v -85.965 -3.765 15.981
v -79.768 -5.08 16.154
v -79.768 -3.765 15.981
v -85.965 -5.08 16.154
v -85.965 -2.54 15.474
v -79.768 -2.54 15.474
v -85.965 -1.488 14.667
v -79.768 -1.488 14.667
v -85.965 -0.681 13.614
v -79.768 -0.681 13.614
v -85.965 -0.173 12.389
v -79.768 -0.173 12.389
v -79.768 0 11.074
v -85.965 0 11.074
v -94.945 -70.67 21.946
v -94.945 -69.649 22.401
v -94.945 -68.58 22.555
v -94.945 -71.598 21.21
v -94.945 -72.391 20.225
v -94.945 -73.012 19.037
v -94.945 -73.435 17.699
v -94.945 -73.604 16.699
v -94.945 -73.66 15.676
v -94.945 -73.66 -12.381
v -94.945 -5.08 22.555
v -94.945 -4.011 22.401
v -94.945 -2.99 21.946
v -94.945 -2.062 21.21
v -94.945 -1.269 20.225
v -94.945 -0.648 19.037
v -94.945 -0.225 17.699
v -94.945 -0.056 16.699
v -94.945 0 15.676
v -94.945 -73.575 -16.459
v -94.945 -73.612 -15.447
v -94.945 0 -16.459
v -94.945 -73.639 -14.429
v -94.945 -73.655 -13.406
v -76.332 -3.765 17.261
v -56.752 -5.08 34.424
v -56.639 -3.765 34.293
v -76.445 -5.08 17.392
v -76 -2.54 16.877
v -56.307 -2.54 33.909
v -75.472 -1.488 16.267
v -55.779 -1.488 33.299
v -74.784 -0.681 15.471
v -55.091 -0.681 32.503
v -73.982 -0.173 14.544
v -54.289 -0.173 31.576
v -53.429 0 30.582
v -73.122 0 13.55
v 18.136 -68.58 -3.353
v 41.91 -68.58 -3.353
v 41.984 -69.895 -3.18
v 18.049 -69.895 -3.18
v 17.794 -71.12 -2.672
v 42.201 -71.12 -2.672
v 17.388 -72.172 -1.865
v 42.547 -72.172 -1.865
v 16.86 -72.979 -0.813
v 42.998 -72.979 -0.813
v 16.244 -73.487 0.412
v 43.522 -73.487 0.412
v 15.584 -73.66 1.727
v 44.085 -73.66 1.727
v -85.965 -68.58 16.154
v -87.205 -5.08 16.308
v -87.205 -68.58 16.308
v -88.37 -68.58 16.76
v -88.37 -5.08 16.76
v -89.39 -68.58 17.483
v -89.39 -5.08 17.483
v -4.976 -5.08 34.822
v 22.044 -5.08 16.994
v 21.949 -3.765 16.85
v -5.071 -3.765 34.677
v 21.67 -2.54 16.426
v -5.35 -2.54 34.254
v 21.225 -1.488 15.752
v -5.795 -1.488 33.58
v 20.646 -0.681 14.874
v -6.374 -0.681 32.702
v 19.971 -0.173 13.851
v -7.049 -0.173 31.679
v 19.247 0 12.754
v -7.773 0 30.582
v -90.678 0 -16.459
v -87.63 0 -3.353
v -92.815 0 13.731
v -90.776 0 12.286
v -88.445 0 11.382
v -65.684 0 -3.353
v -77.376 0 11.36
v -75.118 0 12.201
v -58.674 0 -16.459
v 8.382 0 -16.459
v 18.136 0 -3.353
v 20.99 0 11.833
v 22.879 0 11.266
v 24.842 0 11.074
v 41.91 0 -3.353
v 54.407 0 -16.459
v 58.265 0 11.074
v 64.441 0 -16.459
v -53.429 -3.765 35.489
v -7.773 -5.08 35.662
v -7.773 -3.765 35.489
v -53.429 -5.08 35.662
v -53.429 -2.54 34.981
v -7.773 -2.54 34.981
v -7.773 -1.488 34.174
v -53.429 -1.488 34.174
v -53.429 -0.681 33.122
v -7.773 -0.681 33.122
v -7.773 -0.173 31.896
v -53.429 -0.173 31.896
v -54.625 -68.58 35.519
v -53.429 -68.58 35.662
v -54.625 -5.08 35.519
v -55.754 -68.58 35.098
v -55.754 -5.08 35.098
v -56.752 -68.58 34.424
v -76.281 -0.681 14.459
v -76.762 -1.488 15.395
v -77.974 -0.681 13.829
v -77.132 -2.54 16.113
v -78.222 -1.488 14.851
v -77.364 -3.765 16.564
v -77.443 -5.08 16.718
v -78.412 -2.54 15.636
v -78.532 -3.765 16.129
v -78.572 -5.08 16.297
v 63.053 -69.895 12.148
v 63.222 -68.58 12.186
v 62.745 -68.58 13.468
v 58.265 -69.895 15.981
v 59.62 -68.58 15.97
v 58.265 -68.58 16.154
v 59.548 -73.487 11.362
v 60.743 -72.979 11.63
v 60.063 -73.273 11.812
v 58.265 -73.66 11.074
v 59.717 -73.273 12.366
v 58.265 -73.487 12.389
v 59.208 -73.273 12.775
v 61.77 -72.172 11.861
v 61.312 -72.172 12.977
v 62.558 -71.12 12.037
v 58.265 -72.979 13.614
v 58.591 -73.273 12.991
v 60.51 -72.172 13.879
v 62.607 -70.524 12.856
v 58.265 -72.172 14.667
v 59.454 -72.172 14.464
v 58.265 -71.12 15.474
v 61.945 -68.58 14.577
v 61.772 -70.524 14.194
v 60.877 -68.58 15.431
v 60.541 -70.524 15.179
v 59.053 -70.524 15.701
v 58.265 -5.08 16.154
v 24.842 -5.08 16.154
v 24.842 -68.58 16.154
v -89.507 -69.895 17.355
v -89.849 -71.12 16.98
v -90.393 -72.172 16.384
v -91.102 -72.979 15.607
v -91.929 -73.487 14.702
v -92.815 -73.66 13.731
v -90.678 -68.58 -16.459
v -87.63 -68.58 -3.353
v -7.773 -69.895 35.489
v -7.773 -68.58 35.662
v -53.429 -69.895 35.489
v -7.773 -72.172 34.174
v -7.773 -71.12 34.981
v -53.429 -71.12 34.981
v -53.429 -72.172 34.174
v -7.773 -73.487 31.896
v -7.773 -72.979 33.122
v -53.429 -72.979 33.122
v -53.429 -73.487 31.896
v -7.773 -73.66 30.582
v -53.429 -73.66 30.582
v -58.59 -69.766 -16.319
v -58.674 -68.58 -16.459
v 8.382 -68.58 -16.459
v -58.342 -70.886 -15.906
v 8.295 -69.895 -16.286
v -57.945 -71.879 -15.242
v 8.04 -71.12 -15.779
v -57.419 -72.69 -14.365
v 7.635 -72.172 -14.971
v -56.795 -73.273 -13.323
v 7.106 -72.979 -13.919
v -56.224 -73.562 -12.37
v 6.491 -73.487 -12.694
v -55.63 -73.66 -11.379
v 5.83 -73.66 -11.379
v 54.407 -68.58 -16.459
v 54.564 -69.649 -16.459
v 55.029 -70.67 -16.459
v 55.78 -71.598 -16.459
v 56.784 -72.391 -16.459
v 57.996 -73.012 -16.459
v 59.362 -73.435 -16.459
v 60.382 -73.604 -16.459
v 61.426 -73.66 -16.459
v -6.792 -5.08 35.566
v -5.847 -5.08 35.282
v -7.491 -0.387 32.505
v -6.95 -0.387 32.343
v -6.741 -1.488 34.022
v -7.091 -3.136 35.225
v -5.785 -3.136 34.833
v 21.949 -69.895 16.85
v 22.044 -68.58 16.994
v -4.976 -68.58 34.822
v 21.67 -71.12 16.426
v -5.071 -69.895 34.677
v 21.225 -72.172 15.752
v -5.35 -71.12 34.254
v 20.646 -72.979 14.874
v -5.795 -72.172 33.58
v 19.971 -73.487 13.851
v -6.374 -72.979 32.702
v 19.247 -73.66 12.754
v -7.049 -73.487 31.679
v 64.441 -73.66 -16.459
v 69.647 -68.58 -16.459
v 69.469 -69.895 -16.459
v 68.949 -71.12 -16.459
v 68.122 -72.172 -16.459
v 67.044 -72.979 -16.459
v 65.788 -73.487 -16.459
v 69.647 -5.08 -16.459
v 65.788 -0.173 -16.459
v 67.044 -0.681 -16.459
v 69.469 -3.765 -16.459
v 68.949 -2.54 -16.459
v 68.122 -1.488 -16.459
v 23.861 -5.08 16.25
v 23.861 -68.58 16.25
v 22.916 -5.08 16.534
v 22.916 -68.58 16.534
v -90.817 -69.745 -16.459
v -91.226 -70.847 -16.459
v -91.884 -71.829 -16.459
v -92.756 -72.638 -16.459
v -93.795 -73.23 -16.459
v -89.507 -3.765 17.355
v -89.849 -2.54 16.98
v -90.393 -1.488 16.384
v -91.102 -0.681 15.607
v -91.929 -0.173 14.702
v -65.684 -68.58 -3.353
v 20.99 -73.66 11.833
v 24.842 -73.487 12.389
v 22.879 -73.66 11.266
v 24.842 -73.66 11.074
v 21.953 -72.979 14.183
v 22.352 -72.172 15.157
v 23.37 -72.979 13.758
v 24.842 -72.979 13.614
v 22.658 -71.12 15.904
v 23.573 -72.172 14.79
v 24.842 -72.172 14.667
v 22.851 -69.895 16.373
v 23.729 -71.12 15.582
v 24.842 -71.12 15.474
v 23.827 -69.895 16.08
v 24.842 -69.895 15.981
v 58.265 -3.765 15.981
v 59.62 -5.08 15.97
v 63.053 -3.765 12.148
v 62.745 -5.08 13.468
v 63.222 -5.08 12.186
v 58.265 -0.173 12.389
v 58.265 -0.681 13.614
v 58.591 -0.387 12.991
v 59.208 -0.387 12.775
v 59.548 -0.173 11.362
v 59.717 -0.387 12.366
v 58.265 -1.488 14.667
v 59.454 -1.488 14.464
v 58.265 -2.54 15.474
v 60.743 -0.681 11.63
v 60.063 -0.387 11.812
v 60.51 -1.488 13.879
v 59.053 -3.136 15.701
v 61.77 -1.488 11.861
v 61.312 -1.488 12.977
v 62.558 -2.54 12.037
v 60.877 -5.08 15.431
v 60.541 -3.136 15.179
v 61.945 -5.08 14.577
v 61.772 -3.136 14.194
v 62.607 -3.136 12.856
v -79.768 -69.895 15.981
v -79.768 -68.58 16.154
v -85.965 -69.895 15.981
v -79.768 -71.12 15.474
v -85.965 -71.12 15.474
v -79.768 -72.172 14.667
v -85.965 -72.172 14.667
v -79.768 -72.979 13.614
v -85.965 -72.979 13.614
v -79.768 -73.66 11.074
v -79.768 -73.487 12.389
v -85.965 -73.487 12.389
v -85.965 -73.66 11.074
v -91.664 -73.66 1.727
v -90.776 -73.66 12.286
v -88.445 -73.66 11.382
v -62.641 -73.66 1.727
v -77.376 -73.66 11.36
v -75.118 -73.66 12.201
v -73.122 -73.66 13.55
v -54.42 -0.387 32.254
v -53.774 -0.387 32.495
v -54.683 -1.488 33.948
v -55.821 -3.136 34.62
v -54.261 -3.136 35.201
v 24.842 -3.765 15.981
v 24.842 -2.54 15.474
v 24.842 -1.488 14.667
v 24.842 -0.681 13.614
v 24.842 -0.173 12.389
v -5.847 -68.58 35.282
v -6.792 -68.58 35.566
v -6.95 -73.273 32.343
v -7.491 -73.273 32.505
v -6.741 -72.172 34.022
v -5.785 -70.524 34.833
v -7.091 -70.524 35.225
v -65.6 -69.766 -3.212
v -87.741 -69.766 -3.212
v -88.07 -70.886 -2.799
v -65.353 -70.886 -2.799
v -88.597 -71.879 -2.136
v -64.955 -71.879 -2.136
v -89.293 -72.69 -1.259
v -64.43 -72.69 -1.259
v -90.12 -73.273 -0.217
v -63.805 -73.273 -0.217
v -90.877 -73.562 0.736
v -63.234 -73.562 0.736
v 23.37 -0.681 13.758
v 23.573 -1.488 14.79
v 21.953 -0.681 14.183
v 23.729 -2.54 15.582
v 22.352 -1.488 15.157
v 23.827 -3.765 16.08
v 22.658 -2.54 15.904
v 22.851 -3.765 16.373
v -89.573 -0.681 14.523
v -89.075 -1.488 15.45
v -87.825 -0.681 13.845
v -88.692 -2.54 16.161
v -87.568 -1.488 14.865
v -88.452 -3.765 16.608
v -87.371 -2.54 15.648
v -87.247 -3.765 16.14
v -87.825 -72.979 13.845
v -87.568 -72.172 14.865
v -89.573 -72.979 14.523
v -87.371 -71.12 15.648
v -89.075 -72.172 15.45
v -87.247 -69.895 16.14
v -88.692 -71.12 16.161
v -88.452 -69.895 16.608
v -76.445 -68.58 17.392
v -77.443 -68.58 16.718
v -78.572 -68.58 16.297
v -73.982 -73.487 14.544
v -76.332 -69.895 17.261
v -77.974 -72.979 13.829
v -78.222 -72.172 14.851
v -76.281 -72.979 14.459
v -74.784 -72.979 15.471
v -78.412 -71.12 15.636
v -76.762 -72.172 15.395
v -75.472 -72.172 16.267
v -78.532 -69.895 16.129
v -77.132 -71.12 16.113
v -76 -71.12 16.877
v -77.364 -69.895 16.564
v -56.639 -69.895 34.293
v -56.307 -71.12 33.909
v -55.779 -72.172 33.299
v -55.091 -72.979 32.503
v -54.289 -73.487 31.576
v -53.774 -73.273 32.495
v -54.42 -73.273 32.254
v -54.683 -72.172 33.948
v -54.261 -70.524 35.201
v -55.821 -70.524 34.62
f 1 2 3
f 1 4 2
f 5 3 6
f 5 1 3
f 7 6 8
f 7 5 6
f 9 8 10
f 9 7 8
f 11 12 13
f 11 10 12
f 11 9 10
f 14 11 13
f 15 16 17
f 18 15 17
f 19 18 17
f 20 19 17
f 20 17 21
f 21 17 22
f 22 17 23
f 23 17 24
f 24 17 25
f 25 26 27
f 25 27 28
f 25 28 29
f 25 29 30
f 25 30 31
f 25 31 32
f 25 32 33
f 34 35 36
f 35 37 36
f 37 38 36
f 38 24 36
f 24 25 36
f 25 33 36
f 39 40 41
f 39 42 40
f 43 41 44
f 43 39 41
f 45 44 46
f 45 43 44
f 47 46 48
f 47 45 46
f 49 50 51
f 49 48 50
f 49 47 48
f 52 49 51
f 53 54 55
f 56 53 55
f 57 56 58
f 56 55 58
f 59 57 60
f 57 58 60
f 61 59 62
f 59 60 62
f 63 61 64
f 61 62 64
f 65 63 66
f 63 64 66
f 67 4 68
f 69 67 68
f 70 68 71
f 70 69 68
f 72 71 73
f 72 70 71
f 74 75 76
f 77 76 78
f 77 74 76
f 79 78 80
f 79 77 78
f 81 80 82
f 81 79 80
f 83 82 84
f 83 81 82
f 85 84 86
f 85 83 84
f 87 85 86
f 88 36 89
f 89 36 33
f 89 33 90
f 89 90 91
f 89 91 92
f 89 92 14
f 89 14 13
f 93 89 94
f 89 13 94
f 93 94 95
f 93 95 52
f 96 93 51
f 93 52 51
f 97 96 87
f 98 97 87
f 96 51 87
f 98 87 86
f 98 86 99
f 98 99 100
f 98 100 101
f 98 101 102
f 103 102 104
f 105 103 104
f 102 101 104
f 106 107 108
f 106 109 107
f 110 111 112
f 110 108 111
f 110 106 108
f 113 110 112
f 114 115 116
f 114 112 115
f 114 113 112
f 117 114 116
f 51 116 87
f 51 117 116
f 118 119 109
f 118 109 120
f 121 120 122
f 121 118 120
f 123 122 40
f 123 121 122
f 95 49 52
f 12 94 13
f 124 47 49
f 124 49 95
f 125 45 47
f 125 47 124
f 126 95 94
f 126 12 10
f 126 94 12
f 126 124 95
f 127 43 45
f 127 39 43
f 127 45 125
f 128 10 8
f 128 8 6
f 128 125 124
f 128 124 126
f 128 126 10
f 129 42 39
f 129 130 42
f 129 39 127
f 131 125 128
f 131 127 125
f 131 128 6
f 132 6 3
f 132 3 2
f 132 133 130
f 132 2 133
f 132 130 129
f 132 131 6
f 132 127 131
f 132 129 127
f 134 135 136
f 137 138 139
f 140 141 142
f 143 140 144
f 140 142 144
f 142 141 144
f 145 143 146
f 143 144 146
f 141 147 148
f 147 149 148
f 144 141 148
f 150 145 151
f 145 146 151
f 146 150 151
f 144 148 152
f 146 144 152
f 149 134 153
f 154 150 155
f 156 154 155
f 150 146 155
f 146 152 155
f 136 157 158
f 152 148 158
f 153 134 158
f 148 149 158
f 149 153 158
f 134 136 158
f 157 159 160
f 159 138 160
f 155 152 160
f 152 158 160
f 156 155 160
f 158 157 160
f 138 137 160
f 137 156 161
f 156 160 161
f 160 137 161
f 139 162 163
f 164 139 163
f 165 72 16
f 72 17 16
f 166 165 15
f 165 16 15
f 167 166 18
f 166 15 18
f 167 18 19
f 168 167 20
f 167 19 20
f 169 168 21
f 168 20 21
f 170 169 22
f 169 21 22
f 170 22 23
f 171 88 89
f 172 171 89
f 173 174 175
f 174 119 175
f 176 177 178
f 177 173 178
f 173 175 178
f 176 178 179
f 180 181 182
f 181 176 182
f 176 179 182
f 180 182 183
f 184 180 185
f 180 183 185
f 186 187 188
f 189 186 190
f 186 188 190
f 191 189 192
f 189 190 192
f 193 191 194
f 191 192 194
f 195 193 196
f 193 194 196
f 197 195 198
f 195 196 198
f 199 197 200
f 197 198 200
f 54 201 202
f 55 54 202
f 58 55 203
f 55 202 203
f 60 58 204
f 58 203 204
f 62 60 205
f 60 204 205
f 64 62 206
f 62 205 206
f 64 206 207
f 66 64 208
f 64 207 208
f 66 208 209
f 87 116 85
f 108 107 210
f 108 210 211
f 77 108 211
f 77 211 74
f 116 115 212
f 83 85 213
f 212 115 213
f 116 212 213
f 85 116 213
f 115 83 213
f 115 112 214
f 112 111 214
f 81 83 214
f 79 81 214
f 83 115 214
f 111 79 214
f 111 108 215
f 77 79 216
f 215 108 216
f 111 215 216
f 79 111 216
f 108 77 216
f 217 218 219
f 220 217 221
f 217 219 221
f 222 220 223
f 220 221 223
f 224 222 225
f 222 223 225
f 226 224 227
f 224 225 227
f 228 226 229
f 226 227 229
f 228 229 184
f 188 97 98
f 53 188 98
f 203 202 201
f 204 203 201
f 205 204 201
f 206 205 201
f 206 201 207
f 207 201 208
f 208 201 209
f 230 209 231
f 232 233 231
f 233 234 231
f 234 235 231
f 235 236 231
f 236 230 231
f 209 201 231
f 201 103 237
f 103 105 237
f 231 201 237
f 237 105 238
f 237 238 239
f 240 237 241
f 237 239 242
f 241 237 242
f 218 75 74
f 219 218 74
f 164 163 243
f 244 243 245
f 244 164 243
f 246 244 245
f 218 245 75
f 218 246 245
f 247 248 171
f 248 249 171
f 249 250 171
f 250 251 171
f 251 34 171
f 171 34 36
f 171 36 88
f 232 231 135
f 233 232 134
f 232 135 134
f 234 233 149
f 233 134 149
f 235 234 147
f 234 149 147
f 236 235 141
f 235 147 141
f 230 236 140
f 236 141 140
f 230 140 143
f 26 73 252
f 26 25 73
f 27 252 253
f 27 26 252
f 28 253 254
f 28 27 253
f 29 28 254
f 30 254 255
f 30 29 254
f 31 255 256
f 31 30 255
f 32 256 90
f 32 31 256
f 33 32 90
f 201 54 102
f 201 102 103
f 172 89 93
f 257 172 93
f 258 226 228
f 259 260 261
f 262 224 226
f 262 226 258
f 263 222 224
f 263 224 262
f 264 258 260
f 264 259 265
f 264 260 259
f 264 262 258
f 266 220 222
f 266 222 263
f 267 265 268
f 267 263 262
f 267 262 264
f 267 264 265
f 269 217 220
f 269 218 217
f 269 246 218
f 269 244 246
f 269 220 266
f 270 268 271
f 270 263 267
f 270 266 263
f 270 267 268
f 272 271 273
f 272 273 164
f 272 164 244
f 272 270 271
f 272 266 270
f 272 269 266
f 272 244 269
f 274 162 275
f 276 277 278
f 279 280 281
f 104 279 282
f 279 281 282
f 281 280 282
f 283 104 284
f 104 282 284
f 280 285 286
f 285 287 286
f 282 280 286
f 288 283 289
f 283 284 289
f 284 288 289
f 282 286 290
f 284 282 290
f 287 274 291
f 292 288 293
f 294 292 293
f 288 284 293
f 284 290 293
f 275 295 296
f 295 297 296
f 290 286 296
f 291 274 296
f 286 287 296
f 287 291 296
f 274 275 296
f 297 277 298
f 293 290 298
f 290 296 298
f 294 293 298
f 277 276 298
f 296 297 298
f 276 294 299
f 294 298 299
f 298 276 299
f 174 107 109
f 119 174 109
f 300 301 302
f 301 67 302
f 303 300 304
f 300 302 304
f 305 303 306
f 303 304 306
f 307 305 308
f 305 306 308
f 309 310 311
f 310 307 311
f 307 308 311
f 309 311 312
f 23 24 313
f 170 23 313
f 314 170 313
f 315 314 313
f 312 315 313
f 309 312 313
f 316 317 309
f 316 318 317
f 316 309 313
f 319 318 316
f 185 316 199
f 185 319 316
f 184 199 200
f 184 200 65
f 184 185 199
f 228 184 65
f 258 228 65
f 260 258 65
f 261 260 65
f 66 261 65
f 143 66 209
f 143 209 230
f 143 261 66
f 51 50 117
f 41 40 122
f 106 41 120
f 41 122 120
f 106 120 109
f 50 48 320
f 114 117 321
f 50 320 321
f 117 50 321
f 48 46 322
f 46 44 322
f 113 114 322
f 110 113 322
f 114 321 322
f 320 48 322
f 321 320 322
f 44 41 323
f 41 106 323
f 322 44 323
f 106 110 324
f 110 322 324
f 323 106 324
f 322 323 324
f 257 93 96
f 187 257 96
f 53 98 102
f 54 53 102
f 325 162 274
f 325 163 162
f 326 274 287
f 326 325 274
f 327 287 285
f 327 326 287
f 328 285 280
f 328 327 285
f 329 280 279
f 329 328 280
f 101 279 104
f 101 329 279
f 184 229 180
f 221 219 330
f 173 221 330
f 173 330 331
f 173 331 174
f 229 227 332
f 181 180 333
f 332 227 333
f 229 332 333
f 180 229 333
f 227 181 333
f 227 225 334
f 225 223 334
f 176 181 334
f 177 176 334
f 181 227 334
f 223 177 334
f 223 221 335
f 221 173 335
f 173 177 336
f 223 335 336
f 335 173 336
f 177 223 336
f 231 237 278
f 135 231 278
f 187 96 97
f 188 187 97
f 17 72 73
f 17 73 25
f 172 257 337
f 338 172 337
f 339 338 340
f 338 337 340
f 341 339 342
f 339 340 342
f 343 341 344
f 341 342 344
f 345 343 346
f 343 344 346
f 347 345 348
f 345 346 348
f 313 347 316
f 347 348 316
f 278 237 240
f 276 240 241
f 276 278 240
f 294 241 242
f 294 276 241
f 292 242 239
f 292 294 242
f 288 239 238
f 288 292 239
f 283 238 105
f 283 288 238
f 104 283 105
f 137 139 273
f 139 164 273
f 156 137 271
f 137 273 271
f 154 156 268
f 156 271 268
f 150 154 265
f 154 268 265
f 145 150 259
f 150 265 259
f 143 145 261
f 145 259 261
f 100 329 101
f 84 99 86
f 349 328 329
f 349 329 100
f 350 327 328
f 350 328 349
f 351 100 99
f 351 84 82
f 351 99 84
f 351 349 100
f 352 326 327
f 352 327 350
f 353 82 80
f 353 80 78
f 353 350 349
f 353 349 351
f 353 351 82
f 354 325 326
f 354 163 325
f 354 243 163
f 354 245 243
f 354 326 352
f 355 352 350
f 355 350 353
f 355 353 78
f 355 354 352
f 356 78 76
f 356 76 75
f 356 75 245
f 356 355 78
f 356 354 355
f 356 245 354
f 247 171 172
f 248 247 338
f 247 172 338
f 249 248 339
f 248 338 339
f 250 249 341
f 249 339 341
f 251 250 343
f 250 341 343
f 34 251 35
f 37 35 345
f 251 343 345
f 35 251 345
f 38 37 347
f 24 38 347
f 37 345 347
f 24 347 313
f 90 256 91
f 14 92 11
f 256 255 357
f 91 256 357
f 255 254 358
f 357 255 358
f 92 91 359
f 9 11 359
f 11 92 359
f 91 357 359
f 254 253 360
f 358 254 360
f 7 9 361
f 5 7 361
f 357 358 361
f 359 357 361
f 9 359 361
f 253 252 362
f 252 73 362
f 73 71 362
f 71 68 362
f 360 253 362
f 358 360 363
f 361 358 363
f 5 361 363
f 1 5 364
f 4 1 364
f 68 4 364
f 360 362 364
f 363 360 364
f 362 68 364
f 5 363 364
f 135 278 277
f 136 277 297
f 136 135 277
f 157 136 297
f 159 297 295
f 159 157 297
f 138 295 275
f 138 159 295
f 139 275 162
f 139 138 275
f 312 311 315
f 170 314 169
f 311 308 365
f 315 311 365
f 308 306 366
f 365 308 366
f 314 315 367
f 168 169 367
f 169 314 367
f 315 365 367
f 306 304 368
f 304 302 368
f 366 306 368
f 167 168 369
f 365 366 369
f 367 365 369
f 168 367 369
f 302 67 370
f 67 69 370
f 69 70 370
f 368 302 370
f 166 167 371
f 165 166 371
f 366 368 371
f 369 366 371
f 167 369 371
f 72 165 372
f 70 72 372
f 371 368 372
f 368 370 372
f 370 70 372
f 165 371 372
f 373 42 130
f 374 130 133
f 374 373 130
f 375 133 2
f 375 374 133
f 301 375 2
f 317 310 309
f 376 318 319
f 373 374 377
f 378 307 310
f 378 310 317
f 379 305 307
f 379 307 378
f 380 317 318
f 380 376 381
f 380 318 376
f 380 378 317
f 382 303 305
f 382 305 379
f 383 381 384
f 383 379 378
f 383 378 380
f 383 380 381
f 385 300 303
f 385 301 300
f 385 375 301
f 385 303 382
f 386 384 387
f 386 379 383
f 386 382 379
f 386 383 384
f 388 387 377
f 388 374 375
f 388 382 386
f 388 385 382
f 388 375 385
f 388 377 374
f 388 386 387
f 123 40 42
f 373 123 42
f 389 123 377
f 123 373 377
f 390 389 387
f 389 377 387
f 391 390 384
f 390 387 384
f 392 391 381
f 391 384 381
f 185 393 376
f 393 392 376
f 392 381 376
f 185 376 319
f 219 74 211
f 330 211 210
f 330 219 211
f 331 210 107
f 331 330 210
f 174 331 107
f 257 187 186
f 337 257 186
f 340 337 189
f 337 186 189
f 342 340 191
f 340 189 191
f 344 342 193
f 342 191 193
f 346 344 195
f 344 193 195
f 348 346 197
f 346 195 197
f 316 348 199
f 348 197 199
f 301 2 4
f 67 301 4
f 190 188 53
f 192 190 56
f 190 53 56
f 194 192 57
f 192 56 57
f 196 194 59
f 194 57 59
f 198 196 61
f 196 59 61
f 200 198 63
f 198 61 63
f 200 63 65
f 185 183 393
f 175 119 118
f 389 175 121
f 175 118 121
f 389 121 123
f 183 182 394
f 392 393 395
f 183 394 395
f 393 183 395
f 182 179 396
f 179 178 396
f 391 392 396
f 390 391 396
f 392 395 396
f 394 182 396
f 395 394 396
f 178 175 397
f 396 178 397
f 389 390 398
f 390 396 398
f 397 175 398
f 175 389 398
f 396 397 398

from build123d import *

# Parameters (mm, degrees)
F1_DEPTH = 73.66
F2_R     = 5.08


with BuildPart() as f1:
    # F0 (on Front) → F1 (new body)
    with BuildSketch(Plane.XZ):
        Polygon((-94.9451997876, 22.5552003831), (-94.9451997876, -16.4592005312), (-90.67799896, -16.4592005312), (-87.6299962401, -3.3528001513), (-65.6844004989, -3.3528001513), (-58.6740002036, -16.4592005312), (8.3820000291, -16.4592005312), (18.1356016546, -3.3528001513), (41.9100001454, -3.3528001513), (54.406799376, -16.4592005312), (69.6468055248, -16.4592005312), (62.3316019773, 16.1543991417), (23.3171992004, 16.1543991417), (-6.2483996153, 35.6616005301), (-55.3212016821, 35.6616005301), (-77.8764039278, 16.1543991417), (-87.9347994924, 16.1543991417), align=None)
    extrude(amount=F1_DEPTH)

    # F2
    f2_edges = [f1.edges().sort_by_distance(p)[0] for p in [
        (65.989204, 0, -0.152401),
        (62.331602, -36.83, 16.154399),
        (65.989204, -73.66, -0.152401),
        (42.824401, 0, 16.154399),
        (8.5344, 0, 25.908),
        (-6.2484, -36.83, 35.661601),
        (8.5344, -73.66, 25.908),
        (42.824401, -73.66, 16.154399),
        (23.317199, -36.83, 16.154399),
        (-30.784801, 0, 35.661601),
        (-55.321202, -36.83, 35.661601),
        (-30.784801, -73.66, 35.661601),
        (-66.598803, -73.66, 25.908),
        (-77.876404, -36.83, 16.154399),
        (-66.598803, 0, 25.908),
        (-82.905602, 0, 16.154399),
        (-87.934799, -36.83, 16.154399),
        (-89.153998, -73.66, -9.906),
        (-76.657198, -73.66, -3.3528),
        (-62.1792, -73.66, -9.906),
        (-25.146, -73.66, -16.459201),
        (13.258801, -73.66, -9.906),
        (30.022801, -73.66, -3.3528),
        (48.1584, -73.66, -9.906),
        (-82.905602, -73.66, 16.154399),
        (-91.44, 0, 19.3548),
        (-91.44, -73.66, 19.3548),
    ]]
    fillet(f2_edges, radius=F2_R)


solid = f1.part
